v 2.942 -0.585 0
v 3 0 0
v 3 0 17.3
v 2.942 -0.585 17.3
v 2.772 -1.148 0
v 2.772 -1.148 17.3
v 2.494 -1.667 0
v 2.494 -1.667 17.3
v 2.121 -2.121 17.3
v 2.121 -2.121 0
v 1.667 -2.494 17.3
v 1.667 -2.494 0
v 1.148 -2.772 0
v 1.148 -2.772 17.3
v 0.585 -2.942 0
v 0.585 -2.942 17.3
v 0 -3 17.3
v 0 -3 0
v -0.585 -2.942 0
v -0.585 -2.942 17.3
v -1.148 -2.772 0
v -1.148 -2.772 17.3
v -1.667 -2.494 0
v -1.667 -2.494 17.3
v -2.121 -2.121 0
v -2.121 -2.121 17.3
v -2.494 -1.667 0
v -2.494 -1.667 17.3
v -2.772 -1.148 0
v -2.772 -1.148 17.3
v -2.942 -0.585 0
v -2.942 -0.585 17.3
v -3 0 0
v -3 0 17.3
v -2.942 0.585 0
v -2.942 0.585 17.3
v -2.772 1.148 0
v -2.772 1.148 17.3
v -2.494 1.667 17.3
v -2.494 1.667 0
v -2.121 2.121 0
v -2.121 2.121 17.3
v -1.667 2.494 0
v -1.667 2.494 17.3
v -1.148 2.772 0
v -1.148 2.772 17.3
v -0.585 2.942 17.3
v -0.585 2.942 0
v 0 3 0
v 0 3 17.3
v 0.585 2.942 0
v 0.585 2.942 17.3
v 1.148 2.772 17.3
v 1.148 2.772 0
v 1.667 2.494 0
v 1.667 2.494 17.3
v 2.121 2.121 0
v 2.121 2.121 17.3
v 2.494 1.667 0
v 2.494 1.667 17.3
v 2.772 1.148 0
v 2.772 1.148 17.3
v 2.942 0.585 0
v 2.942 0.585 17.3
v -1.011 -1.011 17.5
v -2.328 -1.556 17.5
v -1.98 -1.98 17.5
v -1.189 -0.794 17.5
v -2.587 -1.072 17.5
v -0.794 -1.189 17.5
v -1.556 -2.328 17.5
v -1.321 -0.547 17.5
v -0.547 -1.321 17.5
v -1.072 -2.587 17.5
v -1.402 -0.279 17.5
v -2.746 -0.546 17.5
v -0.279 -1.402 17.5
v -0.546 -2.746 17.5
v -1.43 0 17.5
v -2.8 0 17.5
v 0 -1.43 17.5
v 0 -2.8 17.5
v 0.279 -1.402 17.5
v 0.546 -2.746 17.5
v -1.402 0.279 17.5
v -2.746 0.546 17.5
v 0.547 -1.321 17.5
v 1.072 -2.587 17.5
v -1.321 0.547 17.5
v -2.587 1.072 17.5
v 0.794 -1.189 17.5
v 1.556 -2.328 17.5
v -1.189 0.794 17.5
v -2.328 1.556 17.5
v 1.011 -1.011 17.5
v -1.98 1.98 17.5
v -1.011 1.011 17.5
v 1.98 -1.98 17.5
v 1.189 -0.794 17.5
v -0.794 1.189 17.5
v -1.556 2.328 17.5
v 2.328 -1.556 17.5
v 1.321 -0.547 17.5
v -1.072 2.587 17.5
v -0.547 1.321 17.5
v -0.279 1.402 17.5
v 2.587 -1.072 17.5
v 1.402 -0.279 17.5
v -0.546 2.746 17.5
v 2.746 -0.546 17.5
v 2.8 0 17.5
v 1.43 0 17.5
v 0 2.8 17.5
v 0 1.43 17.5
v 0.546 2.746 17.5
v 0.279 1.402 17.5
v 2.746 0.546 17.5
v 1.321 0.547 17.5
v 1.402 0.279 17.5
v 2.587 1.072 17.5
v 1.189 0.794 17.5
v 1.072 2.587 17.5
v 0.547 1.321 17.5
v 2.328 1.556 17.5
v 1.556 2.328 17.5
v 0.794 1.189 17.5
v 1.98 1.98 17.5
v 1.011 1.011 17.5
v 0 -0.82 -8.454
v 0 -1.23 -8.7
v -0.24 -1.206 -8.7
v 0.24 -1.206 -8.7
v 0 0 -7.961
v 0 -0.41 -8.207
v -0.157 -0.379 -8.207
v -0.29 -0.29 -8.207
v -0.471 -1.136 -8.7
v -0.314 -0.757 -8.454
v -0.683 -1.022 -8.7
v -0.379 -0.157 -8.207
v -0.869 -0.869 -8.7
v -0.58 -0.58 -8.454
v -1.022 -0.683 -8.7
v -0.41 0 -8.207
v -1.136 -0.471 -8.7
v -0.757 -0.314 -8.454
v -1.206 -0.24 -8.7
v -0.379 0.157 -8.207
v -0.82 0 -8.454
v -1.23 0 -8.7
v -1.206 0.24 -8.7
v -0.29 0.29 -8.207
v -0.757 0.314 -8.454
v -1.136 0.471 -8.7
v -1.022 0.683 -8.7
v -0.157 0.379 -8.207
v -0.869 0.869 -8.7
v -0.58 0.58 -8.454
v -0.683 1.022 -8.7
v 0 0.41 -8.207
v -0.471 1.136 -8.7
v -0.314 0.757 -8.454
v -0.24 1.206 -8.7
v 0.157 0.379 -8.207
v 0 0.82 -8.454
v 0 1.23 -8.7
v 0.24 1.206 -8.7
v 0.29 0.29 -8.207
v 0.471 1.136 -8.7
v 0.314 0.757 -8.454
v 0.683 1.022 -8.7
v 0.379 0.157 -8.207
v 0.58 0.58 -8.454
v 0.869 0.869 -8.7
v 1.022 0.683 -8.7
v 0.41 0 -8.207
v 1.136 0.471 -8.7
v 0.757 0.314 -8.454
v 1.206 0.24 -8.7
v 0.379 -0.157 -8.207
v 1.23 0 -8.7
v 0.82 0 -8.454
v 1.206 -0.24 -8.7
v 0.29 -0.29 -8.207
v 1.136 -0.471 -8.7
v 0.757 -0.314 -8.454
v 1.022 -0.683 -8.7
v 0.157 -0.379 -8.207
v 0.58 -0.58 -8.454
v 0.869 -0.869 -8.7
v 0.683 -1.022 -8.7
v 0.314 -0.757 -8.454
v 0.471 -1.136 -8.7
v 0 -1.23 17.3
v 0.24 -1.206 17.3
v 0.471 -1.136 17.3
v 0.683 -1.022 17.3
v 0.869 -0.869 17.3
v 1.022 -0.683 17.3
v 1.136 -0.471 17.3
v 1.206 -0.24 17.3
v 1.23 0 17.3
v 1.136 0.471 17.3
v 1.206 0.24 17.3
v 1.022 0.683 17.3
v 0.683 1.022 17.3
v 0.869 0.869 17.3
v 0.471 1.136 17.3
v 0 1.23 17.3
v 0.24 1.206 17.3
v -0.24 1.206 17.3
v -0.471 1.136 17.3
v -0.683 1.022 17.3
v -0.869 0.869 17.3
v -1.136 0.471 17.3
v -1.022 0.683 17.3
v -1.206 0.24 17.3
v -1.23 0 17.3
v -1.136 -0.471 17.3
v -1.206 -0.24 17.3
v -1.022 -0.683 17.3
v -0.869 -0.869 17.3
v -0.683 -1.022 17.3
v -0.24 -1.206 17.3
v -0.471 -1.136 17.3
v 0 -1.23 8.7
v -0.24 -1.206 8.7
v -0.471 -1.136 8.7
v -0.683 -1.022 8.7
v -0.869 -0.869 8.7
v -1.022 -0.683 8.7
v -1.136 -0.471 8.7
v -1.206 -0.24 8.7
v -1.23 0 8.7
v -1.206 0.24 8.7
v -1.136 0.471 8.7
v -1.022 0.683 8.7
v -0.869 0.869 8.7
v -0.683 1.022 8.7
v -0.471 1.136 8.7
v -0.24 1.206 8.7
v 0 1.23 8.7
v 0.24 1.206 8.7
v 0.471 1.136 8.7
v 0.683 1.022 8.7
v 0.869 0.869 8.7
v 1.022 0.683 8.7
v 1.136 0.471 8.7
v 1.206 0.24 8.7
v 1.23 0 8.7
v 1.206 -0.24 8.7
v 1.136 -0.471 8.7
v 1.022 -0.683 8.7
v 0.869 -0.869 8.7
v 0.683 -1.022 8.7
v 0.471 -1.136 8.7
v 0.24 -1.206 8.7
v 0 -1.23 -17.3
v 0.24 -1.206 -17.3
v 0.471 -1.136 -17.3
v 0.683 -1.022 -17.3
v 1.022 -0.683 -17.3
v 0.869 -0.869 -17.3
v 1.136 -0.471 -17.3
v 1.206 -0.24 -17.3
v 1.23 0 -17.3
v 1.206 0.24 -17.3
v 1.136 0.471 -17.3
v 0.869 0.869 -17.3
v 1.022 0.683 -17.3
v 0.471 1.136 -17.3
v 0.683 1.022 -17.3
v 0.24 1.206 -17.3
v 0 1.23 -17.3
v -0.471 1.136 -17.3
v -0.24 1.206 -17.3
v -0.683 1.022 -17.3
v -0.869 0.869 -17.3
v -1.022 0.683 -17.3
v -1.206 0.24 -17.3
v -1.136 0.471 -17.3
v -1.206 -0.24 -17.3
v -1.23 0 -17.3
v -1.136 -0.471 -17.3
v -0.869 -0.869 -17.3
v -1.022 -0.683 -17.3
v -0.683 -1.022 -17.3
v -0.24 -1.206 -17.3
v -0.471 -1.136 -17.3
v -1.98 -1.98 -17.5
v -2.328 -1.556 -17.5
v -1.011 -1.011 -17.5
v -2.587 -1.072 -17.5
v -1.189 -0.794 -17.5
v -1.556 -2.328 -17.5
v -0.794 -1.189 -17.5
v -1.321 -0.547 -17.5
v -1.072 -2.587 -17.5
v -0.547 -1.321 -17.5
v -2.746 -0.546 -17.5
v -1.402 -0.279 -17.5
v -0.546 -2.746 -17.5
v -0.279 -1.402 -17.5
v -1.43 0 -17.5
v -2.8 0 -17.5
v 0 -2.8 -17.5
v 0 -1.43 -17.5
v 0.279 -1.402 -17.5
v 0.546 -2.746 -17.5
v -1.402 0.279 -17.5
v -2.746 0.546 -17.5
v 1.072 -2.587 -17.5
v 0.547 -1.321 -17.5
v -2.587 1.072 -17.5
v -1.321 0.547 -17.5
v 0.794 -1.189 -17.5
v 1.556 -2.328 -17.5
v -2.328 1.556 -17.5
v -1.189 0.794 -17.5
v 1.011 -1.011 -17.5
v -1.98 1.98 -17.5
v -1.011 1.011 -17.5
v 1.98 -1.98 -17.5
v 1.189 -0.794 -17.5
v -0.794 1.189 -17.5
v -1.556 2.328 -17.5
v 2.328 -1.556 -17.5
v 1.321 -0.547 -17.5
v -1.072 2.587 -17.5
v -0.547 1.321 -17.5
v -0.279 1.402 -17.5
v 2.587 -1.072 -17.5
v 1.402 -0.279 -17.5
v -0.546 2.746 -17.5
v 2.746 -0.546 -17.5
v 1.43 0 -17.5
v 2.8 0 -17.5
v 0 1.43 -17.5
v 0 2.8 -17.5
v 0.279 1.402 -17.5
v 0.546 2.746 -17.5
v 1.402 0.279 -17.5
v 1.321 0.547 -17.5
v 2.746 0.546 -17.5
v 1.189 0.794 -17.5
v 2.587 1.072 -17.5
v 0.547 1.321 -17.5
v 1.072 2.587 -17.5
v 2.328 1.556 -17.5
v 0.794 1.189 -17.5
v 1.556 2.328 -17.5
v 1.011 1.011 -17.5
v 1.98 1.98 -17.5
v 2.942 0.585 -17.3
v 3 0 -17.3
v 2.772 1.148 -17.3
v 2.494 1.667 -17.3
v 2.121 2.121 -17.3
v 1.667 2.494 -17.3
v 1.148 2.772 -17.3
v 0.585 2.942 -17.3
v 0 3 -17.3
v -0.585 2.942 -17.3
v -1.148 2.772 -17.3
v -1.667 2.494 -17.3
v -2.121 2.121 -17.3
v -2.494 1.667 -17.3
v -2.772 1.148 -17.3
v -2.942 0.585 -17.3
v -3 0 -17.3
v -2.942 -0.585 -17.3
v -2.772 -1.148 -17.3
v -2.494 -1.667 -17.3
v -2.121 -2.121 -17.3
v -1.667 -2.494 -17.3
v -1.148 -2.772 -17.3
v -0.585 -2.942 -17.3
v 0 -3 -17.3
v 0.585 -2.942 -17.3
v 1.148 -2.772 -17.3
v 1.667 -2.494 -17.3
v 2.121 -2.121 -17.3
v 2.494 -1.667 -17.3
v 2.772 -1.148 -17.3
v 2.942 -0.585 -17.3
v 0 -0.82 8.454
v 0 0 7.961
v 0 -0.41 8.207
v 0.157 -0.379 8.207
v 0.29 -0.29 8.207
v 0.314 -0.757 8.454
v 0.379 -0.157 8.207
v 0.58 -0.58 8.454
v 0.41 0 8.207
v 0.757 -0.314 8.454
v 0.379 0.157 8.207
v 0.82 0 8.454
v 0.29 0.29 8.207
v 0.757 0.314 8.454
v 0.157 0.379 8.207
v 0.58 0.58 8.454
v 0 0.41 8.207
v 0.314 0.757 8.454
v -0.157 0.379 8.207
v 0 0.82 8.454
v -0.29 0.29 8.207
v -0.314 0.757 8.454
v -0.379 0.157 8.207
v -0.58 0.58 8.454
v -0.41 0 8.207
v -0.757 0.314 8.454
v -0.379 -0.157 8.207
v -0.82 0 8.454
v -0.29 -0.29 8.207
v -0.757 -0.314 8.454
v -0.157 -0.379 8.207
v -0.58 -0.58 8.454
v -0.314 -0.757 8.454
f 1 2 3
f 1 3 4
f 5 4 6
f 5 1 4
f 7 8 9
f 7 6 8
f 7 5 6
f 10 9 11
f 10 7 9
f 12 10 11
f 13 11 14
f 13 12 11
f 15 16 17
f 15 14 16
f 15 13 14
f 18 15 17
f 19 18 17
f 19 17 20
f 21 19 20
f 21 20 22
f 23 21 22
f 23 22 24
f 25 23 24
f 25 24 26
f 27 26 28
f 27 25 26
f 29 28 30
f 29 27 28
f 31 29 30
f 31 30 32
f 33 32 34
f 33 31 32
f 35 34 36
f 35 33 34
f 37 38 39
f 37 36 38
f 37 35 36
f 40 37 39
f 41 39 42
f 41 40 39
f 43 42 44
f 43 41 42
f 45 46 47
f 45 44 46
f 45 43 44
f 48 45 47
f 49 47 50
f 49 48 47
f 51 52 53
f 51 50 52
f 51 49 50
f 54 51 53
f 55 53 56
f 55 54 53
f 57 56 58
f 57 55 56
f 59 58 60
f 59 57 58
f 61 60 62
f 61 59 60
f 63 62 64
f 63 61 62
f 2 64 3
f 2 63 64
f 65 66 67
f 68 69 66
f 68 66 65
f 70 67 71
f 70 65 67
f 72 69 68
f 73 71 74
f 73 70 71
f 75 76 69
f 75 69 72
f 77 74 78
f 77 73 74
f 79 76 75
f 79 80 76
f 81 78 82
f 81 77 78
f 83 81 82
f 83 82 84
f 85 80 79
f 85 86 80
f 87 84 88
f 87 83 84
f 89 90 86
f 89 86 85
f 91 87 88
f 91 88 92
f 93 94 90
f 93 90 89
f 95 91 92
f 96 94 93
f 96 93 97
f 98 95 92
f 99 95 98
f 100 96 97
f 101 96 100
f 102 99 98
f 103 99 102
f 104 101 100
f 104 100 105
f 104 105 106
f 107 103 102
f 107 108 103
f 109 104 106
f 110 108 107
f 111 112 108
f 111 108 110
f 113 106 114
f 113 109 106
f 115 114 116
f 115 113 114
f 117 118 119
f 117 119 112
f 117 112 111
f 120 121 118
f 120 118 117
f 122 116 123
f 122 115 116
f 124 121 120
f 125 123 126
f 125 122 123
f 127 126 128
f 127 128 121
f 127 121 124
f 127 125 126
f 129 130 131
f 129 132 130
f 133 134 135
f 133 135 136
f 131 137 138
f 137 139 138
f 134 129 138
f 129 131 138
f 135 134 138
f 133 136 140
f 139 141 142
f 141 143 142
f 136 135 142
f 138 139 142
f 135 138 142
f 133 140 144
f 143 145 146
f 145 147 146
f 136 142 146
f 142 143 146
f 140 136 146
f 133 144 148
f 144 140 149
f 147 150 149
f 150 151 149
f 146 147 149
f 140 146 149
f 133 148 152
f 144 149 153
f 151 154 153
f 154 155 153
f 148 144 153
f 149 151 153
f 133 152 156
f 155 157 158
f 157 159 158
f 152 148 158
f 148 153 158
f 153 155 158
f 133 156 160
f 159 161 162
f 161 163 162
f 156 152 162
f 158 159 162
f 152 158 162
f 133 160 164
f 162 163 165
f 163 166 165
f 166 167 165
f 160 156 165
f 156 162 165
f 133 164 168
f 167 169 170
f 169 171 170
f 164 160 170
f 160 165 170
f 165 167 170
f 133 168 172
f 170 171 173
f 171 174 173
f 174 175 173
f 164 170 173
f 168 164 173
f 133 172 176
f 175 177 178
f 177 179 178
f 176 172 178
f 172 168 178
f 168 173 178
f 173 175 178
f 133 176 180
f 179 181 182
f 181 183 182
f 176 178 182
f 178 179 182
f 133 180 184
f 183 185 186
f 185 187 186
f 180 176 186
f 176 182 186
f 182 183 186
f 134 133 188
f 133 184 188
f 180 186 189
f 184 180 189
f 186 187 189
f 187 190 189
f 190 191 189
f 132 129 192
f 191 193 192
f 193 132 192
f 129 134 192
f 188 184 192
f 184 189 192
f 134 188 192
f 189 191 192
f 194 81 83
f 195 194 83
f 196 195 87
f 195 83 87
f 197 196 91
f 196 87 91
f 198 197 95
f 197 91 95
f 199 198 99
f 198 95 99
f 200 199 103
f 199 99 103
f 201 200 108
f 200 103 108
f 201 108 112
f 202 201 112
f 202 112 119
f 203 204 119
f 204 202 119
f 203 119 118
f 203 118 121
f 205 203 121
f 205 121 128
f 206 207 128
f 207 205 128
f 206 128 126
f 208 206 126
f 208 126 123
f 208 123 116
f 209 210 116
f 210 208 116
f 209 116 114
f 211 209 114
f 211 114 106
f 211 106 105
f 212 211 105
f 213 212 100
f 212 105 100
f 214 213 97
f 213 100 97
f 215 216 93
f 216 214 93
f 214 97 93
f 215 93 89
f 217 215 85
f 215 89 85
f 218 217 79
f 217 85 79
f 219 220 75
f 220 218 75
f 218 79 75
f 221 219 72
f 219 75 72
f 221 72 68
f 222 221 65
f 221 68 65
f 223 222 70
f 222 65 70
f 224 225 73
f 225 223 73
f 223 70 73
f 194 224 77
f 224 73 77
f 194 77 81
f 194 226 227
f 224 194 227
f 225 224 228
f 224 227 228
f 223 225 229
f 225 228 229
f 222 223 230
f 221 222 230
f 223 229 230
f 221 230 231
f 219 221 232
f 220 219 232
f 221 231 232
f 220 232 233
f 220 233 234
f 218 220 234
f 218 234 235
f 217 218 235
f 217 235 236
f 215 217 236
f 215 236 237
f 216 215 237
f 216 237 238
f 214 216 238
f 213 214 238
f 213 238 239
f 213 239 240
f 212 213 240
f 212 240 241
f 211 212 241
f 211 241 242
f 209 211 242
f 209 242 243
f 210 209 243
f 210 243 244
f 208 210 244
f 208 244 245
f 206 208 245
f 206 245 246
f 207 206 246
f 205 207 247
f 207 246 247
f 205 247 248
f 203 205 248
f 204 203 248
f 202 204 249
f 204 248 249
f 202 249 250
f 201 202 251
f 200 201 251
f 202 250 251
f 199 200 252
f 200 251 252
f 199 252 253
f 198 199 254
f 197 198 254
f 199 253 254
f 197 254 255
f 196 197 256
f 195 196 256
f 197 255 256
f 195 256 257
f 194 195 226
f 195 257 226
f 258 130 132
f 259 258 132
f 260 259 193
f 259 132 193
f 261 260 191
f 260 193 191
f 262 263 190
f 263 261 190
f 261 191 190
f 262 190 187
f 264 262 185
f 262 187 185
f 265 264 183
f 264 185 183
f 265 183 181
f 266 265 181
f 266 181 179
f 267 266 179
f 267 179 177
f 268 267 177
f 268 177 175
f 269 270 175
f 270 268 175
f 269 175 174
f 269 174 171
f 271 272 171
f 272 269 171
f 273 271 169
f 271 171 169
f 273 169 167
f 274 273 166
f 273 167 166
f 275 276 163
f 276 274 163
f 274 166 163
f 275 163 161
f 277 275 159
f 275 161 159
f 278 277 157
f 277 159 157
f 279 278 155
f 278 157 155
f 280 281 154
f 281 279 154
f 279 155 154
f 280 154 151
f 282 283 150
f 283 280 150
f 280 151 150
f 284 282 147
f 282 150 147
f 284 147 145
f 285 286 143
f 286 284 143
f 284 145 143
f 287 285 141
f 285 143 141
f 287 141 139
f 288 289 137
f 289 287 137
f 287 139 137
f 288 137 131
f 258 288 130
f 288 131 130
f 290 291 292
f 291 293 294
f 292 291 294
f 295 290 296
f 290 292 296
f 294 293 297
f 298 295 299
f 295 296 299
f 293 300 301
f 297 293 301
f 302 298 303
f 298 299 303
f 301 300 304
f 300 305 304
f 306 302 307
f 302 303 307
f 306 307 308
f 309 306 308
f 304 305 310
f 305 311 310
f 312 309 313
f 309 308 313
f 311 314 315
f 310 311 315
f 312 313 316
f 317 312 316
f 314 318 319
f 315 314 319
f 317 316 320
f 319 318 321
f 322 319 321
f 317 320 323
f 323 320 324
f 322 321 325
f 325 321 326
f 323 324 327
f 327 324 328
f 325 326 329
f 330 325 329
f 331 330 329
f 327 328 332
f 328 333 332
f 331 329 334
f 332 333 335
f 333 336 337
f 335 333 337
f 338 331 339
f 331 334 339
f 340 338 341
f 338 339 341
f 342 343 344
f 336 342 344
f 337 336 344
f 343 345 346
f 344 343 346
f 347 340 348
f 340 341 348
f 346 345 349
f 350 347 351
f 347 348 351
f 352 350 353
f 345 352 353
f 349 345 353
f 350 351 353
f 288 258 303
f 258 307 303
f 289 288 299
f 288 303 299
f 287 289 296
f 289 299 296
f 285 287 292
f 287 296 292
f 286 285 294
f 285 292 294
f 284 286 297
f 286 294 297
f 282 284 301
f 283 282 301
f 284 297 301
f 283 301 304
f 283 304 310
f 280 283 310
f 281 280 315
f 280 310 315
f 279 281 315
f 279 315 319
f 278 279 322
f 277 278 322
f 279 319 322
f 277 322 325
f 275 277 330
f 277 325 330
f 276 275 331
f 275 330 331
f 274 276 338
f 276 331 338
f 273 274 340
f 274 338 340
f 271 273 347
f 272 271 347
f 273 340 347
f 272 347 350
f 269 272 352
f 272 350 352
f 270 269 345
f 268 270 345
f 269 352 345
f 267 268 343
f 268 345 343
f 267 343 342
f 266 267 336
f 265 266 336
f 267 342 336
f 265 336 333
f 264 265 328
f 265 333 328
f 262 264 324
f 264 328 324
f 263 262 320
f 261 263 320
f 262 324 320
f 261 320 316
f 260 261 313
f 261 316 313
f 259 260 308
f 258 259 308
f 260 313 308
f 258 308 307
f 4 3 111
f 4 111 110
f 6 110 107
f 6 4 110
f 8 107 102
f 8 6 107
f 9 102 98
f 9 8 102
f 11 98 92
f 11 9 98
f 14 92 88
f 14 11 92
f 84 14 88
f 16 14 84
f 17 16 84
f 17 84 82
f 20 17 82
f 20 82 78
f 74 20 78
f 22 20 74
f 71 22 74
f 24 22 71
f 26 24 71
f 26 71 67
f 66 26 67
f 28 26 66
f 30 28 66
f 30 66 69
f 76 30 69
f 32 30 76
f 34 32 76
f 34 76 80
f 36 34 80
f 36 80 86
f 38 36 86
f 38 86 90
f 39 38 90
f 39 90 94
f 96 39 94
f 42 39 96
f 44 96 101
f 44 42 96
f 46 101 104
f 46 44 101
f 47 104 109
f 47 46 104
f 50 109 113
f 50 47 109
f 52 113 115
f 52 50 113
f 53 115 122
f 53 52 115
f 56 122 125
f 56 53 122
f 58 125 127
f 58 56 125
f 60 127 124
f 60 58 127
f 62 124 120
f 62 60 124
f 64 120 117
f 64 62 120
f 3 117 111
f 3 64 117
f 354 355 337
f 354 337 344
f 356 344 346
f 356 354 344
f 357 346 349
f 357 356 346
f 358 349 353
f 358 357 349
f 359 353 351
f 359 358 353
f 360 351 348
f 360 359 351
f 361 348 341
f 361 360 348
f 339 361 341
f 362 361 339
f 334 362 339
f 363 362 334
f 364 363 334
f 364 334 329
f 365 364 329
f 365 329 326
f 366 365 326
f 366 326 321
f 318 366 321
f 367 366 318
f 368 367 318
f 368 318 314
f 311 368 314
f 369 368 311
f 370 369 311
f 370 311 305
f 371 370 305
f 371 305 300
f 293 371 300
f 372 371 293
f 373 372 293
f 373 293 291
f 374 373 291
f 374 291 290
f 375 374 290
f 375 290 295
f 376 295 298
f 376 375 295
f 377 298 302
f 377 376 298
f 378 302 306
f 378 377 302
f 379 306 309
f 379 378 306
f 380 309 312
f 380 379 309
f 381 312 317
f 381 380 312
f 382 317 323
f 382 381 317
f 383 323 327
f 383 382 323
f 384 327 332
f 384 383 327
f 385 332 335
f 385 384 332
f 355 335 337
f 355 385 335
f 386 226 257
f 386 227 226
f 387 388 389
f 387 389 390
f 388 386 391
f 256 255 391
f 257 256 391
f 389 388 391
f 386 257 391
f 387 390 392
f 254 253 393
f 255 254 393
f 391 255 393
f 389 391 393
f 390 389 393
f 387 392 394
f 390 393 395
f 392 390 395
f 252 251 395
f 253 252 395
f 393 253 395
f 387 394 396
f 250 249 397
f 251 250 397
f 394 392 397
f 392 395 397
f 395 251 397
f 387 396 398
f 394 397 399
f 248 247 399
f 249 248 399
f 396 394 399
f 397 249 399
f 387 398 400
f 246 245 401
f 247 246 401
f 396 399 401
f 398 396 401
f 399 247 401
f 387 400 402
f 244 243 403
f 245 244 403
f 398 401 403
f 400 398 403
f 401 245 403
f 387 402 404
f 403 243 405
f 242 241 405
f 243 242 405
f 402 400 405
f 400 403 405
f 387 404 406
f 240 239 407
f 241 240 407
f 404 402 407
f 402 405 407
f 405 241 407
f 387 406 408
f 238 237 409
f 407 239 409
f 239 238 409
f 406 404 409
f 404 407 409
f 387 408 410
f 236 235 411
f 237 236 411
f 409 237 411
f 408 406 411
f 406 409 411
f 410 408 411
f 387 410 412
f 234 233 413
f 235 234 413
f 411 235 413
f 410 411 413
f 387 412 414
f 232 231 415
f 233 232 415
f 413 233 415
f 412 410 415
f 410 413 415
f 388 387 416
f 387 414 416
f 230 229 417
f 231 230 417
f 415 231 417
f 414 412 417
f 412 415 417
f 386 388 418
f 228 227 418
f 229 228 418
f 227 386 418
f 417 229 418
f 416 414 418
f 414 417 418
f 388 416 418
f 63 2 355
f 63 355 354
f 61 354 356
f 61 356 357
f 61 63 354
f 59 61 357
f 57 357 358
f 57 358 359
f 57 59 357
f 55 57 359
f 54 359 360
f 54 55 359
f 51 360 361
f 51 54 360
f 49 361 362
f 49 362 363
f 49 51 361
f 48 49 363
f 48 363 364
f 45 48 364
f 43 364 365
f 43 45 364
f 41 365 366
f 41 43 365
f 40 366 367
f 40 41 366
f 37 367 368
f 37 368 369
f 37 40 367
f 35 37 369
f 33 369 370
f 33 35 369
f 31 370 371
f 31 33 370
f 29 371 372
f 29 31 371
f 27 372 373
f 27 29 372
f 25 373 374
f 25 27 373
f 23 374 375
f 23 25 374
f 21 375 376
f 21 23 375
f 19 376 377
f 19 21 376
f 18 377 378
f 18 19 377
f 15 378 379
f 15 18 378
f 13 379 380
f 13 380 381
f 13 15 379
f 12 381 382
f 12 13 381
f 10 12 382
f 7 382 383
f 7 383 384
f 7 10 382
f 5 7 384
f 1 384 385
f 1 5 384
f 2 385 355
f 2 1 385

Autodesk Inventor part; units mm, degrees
ref_plane "YZ Plane" through (0, 0, 0) normal (1, 0, 0) x (0, 1, 0)
ref_plane "XZ Plane" through (0, 0, 0) normal (0, 1, 0) x (-1, 0, 0)
ref_plane "XY Plane" through (0, 0, 0) normal (0, 0, 1) x (1, 0, 0)
sketch "スケッチ1" plane through (0, 0, 0) normal (0, 0, 1) x (1, 0, 0)
  circle A0 centre (0, 0) radius 3
  dimension "d13" = 6
extrude "押し出し1" add sketch "スケッチ1" along normal mid plane 35
sketch "スケッチ2" plane through (0, 0, 17.5) normal (0, 0, 1) x (1, 0, 0)
  point P0 (0, 0)
  point P1 (0, 0)
hole "穴1" at (0, 0, 17.5) direction (0, 0, -1) diameter 2.459 depth 8.8 tip angle 118 thread size "M3x0.5" class "6H" standard "ANSI Metric M Profile"
mirror "ミラー1" about plane through (0, 0, 0) normal (0, 0, 1) of "穴1"
chamfer "面取り1" distance 0.2 angle 45 4 edges at (0, 1.2295, 17.5) (-3, 0, 17.5) (-3, 0, -17.5) (0, 1.2295, -17.5)
properties part number "ARF-330" material "鋼、炭素鋼"
